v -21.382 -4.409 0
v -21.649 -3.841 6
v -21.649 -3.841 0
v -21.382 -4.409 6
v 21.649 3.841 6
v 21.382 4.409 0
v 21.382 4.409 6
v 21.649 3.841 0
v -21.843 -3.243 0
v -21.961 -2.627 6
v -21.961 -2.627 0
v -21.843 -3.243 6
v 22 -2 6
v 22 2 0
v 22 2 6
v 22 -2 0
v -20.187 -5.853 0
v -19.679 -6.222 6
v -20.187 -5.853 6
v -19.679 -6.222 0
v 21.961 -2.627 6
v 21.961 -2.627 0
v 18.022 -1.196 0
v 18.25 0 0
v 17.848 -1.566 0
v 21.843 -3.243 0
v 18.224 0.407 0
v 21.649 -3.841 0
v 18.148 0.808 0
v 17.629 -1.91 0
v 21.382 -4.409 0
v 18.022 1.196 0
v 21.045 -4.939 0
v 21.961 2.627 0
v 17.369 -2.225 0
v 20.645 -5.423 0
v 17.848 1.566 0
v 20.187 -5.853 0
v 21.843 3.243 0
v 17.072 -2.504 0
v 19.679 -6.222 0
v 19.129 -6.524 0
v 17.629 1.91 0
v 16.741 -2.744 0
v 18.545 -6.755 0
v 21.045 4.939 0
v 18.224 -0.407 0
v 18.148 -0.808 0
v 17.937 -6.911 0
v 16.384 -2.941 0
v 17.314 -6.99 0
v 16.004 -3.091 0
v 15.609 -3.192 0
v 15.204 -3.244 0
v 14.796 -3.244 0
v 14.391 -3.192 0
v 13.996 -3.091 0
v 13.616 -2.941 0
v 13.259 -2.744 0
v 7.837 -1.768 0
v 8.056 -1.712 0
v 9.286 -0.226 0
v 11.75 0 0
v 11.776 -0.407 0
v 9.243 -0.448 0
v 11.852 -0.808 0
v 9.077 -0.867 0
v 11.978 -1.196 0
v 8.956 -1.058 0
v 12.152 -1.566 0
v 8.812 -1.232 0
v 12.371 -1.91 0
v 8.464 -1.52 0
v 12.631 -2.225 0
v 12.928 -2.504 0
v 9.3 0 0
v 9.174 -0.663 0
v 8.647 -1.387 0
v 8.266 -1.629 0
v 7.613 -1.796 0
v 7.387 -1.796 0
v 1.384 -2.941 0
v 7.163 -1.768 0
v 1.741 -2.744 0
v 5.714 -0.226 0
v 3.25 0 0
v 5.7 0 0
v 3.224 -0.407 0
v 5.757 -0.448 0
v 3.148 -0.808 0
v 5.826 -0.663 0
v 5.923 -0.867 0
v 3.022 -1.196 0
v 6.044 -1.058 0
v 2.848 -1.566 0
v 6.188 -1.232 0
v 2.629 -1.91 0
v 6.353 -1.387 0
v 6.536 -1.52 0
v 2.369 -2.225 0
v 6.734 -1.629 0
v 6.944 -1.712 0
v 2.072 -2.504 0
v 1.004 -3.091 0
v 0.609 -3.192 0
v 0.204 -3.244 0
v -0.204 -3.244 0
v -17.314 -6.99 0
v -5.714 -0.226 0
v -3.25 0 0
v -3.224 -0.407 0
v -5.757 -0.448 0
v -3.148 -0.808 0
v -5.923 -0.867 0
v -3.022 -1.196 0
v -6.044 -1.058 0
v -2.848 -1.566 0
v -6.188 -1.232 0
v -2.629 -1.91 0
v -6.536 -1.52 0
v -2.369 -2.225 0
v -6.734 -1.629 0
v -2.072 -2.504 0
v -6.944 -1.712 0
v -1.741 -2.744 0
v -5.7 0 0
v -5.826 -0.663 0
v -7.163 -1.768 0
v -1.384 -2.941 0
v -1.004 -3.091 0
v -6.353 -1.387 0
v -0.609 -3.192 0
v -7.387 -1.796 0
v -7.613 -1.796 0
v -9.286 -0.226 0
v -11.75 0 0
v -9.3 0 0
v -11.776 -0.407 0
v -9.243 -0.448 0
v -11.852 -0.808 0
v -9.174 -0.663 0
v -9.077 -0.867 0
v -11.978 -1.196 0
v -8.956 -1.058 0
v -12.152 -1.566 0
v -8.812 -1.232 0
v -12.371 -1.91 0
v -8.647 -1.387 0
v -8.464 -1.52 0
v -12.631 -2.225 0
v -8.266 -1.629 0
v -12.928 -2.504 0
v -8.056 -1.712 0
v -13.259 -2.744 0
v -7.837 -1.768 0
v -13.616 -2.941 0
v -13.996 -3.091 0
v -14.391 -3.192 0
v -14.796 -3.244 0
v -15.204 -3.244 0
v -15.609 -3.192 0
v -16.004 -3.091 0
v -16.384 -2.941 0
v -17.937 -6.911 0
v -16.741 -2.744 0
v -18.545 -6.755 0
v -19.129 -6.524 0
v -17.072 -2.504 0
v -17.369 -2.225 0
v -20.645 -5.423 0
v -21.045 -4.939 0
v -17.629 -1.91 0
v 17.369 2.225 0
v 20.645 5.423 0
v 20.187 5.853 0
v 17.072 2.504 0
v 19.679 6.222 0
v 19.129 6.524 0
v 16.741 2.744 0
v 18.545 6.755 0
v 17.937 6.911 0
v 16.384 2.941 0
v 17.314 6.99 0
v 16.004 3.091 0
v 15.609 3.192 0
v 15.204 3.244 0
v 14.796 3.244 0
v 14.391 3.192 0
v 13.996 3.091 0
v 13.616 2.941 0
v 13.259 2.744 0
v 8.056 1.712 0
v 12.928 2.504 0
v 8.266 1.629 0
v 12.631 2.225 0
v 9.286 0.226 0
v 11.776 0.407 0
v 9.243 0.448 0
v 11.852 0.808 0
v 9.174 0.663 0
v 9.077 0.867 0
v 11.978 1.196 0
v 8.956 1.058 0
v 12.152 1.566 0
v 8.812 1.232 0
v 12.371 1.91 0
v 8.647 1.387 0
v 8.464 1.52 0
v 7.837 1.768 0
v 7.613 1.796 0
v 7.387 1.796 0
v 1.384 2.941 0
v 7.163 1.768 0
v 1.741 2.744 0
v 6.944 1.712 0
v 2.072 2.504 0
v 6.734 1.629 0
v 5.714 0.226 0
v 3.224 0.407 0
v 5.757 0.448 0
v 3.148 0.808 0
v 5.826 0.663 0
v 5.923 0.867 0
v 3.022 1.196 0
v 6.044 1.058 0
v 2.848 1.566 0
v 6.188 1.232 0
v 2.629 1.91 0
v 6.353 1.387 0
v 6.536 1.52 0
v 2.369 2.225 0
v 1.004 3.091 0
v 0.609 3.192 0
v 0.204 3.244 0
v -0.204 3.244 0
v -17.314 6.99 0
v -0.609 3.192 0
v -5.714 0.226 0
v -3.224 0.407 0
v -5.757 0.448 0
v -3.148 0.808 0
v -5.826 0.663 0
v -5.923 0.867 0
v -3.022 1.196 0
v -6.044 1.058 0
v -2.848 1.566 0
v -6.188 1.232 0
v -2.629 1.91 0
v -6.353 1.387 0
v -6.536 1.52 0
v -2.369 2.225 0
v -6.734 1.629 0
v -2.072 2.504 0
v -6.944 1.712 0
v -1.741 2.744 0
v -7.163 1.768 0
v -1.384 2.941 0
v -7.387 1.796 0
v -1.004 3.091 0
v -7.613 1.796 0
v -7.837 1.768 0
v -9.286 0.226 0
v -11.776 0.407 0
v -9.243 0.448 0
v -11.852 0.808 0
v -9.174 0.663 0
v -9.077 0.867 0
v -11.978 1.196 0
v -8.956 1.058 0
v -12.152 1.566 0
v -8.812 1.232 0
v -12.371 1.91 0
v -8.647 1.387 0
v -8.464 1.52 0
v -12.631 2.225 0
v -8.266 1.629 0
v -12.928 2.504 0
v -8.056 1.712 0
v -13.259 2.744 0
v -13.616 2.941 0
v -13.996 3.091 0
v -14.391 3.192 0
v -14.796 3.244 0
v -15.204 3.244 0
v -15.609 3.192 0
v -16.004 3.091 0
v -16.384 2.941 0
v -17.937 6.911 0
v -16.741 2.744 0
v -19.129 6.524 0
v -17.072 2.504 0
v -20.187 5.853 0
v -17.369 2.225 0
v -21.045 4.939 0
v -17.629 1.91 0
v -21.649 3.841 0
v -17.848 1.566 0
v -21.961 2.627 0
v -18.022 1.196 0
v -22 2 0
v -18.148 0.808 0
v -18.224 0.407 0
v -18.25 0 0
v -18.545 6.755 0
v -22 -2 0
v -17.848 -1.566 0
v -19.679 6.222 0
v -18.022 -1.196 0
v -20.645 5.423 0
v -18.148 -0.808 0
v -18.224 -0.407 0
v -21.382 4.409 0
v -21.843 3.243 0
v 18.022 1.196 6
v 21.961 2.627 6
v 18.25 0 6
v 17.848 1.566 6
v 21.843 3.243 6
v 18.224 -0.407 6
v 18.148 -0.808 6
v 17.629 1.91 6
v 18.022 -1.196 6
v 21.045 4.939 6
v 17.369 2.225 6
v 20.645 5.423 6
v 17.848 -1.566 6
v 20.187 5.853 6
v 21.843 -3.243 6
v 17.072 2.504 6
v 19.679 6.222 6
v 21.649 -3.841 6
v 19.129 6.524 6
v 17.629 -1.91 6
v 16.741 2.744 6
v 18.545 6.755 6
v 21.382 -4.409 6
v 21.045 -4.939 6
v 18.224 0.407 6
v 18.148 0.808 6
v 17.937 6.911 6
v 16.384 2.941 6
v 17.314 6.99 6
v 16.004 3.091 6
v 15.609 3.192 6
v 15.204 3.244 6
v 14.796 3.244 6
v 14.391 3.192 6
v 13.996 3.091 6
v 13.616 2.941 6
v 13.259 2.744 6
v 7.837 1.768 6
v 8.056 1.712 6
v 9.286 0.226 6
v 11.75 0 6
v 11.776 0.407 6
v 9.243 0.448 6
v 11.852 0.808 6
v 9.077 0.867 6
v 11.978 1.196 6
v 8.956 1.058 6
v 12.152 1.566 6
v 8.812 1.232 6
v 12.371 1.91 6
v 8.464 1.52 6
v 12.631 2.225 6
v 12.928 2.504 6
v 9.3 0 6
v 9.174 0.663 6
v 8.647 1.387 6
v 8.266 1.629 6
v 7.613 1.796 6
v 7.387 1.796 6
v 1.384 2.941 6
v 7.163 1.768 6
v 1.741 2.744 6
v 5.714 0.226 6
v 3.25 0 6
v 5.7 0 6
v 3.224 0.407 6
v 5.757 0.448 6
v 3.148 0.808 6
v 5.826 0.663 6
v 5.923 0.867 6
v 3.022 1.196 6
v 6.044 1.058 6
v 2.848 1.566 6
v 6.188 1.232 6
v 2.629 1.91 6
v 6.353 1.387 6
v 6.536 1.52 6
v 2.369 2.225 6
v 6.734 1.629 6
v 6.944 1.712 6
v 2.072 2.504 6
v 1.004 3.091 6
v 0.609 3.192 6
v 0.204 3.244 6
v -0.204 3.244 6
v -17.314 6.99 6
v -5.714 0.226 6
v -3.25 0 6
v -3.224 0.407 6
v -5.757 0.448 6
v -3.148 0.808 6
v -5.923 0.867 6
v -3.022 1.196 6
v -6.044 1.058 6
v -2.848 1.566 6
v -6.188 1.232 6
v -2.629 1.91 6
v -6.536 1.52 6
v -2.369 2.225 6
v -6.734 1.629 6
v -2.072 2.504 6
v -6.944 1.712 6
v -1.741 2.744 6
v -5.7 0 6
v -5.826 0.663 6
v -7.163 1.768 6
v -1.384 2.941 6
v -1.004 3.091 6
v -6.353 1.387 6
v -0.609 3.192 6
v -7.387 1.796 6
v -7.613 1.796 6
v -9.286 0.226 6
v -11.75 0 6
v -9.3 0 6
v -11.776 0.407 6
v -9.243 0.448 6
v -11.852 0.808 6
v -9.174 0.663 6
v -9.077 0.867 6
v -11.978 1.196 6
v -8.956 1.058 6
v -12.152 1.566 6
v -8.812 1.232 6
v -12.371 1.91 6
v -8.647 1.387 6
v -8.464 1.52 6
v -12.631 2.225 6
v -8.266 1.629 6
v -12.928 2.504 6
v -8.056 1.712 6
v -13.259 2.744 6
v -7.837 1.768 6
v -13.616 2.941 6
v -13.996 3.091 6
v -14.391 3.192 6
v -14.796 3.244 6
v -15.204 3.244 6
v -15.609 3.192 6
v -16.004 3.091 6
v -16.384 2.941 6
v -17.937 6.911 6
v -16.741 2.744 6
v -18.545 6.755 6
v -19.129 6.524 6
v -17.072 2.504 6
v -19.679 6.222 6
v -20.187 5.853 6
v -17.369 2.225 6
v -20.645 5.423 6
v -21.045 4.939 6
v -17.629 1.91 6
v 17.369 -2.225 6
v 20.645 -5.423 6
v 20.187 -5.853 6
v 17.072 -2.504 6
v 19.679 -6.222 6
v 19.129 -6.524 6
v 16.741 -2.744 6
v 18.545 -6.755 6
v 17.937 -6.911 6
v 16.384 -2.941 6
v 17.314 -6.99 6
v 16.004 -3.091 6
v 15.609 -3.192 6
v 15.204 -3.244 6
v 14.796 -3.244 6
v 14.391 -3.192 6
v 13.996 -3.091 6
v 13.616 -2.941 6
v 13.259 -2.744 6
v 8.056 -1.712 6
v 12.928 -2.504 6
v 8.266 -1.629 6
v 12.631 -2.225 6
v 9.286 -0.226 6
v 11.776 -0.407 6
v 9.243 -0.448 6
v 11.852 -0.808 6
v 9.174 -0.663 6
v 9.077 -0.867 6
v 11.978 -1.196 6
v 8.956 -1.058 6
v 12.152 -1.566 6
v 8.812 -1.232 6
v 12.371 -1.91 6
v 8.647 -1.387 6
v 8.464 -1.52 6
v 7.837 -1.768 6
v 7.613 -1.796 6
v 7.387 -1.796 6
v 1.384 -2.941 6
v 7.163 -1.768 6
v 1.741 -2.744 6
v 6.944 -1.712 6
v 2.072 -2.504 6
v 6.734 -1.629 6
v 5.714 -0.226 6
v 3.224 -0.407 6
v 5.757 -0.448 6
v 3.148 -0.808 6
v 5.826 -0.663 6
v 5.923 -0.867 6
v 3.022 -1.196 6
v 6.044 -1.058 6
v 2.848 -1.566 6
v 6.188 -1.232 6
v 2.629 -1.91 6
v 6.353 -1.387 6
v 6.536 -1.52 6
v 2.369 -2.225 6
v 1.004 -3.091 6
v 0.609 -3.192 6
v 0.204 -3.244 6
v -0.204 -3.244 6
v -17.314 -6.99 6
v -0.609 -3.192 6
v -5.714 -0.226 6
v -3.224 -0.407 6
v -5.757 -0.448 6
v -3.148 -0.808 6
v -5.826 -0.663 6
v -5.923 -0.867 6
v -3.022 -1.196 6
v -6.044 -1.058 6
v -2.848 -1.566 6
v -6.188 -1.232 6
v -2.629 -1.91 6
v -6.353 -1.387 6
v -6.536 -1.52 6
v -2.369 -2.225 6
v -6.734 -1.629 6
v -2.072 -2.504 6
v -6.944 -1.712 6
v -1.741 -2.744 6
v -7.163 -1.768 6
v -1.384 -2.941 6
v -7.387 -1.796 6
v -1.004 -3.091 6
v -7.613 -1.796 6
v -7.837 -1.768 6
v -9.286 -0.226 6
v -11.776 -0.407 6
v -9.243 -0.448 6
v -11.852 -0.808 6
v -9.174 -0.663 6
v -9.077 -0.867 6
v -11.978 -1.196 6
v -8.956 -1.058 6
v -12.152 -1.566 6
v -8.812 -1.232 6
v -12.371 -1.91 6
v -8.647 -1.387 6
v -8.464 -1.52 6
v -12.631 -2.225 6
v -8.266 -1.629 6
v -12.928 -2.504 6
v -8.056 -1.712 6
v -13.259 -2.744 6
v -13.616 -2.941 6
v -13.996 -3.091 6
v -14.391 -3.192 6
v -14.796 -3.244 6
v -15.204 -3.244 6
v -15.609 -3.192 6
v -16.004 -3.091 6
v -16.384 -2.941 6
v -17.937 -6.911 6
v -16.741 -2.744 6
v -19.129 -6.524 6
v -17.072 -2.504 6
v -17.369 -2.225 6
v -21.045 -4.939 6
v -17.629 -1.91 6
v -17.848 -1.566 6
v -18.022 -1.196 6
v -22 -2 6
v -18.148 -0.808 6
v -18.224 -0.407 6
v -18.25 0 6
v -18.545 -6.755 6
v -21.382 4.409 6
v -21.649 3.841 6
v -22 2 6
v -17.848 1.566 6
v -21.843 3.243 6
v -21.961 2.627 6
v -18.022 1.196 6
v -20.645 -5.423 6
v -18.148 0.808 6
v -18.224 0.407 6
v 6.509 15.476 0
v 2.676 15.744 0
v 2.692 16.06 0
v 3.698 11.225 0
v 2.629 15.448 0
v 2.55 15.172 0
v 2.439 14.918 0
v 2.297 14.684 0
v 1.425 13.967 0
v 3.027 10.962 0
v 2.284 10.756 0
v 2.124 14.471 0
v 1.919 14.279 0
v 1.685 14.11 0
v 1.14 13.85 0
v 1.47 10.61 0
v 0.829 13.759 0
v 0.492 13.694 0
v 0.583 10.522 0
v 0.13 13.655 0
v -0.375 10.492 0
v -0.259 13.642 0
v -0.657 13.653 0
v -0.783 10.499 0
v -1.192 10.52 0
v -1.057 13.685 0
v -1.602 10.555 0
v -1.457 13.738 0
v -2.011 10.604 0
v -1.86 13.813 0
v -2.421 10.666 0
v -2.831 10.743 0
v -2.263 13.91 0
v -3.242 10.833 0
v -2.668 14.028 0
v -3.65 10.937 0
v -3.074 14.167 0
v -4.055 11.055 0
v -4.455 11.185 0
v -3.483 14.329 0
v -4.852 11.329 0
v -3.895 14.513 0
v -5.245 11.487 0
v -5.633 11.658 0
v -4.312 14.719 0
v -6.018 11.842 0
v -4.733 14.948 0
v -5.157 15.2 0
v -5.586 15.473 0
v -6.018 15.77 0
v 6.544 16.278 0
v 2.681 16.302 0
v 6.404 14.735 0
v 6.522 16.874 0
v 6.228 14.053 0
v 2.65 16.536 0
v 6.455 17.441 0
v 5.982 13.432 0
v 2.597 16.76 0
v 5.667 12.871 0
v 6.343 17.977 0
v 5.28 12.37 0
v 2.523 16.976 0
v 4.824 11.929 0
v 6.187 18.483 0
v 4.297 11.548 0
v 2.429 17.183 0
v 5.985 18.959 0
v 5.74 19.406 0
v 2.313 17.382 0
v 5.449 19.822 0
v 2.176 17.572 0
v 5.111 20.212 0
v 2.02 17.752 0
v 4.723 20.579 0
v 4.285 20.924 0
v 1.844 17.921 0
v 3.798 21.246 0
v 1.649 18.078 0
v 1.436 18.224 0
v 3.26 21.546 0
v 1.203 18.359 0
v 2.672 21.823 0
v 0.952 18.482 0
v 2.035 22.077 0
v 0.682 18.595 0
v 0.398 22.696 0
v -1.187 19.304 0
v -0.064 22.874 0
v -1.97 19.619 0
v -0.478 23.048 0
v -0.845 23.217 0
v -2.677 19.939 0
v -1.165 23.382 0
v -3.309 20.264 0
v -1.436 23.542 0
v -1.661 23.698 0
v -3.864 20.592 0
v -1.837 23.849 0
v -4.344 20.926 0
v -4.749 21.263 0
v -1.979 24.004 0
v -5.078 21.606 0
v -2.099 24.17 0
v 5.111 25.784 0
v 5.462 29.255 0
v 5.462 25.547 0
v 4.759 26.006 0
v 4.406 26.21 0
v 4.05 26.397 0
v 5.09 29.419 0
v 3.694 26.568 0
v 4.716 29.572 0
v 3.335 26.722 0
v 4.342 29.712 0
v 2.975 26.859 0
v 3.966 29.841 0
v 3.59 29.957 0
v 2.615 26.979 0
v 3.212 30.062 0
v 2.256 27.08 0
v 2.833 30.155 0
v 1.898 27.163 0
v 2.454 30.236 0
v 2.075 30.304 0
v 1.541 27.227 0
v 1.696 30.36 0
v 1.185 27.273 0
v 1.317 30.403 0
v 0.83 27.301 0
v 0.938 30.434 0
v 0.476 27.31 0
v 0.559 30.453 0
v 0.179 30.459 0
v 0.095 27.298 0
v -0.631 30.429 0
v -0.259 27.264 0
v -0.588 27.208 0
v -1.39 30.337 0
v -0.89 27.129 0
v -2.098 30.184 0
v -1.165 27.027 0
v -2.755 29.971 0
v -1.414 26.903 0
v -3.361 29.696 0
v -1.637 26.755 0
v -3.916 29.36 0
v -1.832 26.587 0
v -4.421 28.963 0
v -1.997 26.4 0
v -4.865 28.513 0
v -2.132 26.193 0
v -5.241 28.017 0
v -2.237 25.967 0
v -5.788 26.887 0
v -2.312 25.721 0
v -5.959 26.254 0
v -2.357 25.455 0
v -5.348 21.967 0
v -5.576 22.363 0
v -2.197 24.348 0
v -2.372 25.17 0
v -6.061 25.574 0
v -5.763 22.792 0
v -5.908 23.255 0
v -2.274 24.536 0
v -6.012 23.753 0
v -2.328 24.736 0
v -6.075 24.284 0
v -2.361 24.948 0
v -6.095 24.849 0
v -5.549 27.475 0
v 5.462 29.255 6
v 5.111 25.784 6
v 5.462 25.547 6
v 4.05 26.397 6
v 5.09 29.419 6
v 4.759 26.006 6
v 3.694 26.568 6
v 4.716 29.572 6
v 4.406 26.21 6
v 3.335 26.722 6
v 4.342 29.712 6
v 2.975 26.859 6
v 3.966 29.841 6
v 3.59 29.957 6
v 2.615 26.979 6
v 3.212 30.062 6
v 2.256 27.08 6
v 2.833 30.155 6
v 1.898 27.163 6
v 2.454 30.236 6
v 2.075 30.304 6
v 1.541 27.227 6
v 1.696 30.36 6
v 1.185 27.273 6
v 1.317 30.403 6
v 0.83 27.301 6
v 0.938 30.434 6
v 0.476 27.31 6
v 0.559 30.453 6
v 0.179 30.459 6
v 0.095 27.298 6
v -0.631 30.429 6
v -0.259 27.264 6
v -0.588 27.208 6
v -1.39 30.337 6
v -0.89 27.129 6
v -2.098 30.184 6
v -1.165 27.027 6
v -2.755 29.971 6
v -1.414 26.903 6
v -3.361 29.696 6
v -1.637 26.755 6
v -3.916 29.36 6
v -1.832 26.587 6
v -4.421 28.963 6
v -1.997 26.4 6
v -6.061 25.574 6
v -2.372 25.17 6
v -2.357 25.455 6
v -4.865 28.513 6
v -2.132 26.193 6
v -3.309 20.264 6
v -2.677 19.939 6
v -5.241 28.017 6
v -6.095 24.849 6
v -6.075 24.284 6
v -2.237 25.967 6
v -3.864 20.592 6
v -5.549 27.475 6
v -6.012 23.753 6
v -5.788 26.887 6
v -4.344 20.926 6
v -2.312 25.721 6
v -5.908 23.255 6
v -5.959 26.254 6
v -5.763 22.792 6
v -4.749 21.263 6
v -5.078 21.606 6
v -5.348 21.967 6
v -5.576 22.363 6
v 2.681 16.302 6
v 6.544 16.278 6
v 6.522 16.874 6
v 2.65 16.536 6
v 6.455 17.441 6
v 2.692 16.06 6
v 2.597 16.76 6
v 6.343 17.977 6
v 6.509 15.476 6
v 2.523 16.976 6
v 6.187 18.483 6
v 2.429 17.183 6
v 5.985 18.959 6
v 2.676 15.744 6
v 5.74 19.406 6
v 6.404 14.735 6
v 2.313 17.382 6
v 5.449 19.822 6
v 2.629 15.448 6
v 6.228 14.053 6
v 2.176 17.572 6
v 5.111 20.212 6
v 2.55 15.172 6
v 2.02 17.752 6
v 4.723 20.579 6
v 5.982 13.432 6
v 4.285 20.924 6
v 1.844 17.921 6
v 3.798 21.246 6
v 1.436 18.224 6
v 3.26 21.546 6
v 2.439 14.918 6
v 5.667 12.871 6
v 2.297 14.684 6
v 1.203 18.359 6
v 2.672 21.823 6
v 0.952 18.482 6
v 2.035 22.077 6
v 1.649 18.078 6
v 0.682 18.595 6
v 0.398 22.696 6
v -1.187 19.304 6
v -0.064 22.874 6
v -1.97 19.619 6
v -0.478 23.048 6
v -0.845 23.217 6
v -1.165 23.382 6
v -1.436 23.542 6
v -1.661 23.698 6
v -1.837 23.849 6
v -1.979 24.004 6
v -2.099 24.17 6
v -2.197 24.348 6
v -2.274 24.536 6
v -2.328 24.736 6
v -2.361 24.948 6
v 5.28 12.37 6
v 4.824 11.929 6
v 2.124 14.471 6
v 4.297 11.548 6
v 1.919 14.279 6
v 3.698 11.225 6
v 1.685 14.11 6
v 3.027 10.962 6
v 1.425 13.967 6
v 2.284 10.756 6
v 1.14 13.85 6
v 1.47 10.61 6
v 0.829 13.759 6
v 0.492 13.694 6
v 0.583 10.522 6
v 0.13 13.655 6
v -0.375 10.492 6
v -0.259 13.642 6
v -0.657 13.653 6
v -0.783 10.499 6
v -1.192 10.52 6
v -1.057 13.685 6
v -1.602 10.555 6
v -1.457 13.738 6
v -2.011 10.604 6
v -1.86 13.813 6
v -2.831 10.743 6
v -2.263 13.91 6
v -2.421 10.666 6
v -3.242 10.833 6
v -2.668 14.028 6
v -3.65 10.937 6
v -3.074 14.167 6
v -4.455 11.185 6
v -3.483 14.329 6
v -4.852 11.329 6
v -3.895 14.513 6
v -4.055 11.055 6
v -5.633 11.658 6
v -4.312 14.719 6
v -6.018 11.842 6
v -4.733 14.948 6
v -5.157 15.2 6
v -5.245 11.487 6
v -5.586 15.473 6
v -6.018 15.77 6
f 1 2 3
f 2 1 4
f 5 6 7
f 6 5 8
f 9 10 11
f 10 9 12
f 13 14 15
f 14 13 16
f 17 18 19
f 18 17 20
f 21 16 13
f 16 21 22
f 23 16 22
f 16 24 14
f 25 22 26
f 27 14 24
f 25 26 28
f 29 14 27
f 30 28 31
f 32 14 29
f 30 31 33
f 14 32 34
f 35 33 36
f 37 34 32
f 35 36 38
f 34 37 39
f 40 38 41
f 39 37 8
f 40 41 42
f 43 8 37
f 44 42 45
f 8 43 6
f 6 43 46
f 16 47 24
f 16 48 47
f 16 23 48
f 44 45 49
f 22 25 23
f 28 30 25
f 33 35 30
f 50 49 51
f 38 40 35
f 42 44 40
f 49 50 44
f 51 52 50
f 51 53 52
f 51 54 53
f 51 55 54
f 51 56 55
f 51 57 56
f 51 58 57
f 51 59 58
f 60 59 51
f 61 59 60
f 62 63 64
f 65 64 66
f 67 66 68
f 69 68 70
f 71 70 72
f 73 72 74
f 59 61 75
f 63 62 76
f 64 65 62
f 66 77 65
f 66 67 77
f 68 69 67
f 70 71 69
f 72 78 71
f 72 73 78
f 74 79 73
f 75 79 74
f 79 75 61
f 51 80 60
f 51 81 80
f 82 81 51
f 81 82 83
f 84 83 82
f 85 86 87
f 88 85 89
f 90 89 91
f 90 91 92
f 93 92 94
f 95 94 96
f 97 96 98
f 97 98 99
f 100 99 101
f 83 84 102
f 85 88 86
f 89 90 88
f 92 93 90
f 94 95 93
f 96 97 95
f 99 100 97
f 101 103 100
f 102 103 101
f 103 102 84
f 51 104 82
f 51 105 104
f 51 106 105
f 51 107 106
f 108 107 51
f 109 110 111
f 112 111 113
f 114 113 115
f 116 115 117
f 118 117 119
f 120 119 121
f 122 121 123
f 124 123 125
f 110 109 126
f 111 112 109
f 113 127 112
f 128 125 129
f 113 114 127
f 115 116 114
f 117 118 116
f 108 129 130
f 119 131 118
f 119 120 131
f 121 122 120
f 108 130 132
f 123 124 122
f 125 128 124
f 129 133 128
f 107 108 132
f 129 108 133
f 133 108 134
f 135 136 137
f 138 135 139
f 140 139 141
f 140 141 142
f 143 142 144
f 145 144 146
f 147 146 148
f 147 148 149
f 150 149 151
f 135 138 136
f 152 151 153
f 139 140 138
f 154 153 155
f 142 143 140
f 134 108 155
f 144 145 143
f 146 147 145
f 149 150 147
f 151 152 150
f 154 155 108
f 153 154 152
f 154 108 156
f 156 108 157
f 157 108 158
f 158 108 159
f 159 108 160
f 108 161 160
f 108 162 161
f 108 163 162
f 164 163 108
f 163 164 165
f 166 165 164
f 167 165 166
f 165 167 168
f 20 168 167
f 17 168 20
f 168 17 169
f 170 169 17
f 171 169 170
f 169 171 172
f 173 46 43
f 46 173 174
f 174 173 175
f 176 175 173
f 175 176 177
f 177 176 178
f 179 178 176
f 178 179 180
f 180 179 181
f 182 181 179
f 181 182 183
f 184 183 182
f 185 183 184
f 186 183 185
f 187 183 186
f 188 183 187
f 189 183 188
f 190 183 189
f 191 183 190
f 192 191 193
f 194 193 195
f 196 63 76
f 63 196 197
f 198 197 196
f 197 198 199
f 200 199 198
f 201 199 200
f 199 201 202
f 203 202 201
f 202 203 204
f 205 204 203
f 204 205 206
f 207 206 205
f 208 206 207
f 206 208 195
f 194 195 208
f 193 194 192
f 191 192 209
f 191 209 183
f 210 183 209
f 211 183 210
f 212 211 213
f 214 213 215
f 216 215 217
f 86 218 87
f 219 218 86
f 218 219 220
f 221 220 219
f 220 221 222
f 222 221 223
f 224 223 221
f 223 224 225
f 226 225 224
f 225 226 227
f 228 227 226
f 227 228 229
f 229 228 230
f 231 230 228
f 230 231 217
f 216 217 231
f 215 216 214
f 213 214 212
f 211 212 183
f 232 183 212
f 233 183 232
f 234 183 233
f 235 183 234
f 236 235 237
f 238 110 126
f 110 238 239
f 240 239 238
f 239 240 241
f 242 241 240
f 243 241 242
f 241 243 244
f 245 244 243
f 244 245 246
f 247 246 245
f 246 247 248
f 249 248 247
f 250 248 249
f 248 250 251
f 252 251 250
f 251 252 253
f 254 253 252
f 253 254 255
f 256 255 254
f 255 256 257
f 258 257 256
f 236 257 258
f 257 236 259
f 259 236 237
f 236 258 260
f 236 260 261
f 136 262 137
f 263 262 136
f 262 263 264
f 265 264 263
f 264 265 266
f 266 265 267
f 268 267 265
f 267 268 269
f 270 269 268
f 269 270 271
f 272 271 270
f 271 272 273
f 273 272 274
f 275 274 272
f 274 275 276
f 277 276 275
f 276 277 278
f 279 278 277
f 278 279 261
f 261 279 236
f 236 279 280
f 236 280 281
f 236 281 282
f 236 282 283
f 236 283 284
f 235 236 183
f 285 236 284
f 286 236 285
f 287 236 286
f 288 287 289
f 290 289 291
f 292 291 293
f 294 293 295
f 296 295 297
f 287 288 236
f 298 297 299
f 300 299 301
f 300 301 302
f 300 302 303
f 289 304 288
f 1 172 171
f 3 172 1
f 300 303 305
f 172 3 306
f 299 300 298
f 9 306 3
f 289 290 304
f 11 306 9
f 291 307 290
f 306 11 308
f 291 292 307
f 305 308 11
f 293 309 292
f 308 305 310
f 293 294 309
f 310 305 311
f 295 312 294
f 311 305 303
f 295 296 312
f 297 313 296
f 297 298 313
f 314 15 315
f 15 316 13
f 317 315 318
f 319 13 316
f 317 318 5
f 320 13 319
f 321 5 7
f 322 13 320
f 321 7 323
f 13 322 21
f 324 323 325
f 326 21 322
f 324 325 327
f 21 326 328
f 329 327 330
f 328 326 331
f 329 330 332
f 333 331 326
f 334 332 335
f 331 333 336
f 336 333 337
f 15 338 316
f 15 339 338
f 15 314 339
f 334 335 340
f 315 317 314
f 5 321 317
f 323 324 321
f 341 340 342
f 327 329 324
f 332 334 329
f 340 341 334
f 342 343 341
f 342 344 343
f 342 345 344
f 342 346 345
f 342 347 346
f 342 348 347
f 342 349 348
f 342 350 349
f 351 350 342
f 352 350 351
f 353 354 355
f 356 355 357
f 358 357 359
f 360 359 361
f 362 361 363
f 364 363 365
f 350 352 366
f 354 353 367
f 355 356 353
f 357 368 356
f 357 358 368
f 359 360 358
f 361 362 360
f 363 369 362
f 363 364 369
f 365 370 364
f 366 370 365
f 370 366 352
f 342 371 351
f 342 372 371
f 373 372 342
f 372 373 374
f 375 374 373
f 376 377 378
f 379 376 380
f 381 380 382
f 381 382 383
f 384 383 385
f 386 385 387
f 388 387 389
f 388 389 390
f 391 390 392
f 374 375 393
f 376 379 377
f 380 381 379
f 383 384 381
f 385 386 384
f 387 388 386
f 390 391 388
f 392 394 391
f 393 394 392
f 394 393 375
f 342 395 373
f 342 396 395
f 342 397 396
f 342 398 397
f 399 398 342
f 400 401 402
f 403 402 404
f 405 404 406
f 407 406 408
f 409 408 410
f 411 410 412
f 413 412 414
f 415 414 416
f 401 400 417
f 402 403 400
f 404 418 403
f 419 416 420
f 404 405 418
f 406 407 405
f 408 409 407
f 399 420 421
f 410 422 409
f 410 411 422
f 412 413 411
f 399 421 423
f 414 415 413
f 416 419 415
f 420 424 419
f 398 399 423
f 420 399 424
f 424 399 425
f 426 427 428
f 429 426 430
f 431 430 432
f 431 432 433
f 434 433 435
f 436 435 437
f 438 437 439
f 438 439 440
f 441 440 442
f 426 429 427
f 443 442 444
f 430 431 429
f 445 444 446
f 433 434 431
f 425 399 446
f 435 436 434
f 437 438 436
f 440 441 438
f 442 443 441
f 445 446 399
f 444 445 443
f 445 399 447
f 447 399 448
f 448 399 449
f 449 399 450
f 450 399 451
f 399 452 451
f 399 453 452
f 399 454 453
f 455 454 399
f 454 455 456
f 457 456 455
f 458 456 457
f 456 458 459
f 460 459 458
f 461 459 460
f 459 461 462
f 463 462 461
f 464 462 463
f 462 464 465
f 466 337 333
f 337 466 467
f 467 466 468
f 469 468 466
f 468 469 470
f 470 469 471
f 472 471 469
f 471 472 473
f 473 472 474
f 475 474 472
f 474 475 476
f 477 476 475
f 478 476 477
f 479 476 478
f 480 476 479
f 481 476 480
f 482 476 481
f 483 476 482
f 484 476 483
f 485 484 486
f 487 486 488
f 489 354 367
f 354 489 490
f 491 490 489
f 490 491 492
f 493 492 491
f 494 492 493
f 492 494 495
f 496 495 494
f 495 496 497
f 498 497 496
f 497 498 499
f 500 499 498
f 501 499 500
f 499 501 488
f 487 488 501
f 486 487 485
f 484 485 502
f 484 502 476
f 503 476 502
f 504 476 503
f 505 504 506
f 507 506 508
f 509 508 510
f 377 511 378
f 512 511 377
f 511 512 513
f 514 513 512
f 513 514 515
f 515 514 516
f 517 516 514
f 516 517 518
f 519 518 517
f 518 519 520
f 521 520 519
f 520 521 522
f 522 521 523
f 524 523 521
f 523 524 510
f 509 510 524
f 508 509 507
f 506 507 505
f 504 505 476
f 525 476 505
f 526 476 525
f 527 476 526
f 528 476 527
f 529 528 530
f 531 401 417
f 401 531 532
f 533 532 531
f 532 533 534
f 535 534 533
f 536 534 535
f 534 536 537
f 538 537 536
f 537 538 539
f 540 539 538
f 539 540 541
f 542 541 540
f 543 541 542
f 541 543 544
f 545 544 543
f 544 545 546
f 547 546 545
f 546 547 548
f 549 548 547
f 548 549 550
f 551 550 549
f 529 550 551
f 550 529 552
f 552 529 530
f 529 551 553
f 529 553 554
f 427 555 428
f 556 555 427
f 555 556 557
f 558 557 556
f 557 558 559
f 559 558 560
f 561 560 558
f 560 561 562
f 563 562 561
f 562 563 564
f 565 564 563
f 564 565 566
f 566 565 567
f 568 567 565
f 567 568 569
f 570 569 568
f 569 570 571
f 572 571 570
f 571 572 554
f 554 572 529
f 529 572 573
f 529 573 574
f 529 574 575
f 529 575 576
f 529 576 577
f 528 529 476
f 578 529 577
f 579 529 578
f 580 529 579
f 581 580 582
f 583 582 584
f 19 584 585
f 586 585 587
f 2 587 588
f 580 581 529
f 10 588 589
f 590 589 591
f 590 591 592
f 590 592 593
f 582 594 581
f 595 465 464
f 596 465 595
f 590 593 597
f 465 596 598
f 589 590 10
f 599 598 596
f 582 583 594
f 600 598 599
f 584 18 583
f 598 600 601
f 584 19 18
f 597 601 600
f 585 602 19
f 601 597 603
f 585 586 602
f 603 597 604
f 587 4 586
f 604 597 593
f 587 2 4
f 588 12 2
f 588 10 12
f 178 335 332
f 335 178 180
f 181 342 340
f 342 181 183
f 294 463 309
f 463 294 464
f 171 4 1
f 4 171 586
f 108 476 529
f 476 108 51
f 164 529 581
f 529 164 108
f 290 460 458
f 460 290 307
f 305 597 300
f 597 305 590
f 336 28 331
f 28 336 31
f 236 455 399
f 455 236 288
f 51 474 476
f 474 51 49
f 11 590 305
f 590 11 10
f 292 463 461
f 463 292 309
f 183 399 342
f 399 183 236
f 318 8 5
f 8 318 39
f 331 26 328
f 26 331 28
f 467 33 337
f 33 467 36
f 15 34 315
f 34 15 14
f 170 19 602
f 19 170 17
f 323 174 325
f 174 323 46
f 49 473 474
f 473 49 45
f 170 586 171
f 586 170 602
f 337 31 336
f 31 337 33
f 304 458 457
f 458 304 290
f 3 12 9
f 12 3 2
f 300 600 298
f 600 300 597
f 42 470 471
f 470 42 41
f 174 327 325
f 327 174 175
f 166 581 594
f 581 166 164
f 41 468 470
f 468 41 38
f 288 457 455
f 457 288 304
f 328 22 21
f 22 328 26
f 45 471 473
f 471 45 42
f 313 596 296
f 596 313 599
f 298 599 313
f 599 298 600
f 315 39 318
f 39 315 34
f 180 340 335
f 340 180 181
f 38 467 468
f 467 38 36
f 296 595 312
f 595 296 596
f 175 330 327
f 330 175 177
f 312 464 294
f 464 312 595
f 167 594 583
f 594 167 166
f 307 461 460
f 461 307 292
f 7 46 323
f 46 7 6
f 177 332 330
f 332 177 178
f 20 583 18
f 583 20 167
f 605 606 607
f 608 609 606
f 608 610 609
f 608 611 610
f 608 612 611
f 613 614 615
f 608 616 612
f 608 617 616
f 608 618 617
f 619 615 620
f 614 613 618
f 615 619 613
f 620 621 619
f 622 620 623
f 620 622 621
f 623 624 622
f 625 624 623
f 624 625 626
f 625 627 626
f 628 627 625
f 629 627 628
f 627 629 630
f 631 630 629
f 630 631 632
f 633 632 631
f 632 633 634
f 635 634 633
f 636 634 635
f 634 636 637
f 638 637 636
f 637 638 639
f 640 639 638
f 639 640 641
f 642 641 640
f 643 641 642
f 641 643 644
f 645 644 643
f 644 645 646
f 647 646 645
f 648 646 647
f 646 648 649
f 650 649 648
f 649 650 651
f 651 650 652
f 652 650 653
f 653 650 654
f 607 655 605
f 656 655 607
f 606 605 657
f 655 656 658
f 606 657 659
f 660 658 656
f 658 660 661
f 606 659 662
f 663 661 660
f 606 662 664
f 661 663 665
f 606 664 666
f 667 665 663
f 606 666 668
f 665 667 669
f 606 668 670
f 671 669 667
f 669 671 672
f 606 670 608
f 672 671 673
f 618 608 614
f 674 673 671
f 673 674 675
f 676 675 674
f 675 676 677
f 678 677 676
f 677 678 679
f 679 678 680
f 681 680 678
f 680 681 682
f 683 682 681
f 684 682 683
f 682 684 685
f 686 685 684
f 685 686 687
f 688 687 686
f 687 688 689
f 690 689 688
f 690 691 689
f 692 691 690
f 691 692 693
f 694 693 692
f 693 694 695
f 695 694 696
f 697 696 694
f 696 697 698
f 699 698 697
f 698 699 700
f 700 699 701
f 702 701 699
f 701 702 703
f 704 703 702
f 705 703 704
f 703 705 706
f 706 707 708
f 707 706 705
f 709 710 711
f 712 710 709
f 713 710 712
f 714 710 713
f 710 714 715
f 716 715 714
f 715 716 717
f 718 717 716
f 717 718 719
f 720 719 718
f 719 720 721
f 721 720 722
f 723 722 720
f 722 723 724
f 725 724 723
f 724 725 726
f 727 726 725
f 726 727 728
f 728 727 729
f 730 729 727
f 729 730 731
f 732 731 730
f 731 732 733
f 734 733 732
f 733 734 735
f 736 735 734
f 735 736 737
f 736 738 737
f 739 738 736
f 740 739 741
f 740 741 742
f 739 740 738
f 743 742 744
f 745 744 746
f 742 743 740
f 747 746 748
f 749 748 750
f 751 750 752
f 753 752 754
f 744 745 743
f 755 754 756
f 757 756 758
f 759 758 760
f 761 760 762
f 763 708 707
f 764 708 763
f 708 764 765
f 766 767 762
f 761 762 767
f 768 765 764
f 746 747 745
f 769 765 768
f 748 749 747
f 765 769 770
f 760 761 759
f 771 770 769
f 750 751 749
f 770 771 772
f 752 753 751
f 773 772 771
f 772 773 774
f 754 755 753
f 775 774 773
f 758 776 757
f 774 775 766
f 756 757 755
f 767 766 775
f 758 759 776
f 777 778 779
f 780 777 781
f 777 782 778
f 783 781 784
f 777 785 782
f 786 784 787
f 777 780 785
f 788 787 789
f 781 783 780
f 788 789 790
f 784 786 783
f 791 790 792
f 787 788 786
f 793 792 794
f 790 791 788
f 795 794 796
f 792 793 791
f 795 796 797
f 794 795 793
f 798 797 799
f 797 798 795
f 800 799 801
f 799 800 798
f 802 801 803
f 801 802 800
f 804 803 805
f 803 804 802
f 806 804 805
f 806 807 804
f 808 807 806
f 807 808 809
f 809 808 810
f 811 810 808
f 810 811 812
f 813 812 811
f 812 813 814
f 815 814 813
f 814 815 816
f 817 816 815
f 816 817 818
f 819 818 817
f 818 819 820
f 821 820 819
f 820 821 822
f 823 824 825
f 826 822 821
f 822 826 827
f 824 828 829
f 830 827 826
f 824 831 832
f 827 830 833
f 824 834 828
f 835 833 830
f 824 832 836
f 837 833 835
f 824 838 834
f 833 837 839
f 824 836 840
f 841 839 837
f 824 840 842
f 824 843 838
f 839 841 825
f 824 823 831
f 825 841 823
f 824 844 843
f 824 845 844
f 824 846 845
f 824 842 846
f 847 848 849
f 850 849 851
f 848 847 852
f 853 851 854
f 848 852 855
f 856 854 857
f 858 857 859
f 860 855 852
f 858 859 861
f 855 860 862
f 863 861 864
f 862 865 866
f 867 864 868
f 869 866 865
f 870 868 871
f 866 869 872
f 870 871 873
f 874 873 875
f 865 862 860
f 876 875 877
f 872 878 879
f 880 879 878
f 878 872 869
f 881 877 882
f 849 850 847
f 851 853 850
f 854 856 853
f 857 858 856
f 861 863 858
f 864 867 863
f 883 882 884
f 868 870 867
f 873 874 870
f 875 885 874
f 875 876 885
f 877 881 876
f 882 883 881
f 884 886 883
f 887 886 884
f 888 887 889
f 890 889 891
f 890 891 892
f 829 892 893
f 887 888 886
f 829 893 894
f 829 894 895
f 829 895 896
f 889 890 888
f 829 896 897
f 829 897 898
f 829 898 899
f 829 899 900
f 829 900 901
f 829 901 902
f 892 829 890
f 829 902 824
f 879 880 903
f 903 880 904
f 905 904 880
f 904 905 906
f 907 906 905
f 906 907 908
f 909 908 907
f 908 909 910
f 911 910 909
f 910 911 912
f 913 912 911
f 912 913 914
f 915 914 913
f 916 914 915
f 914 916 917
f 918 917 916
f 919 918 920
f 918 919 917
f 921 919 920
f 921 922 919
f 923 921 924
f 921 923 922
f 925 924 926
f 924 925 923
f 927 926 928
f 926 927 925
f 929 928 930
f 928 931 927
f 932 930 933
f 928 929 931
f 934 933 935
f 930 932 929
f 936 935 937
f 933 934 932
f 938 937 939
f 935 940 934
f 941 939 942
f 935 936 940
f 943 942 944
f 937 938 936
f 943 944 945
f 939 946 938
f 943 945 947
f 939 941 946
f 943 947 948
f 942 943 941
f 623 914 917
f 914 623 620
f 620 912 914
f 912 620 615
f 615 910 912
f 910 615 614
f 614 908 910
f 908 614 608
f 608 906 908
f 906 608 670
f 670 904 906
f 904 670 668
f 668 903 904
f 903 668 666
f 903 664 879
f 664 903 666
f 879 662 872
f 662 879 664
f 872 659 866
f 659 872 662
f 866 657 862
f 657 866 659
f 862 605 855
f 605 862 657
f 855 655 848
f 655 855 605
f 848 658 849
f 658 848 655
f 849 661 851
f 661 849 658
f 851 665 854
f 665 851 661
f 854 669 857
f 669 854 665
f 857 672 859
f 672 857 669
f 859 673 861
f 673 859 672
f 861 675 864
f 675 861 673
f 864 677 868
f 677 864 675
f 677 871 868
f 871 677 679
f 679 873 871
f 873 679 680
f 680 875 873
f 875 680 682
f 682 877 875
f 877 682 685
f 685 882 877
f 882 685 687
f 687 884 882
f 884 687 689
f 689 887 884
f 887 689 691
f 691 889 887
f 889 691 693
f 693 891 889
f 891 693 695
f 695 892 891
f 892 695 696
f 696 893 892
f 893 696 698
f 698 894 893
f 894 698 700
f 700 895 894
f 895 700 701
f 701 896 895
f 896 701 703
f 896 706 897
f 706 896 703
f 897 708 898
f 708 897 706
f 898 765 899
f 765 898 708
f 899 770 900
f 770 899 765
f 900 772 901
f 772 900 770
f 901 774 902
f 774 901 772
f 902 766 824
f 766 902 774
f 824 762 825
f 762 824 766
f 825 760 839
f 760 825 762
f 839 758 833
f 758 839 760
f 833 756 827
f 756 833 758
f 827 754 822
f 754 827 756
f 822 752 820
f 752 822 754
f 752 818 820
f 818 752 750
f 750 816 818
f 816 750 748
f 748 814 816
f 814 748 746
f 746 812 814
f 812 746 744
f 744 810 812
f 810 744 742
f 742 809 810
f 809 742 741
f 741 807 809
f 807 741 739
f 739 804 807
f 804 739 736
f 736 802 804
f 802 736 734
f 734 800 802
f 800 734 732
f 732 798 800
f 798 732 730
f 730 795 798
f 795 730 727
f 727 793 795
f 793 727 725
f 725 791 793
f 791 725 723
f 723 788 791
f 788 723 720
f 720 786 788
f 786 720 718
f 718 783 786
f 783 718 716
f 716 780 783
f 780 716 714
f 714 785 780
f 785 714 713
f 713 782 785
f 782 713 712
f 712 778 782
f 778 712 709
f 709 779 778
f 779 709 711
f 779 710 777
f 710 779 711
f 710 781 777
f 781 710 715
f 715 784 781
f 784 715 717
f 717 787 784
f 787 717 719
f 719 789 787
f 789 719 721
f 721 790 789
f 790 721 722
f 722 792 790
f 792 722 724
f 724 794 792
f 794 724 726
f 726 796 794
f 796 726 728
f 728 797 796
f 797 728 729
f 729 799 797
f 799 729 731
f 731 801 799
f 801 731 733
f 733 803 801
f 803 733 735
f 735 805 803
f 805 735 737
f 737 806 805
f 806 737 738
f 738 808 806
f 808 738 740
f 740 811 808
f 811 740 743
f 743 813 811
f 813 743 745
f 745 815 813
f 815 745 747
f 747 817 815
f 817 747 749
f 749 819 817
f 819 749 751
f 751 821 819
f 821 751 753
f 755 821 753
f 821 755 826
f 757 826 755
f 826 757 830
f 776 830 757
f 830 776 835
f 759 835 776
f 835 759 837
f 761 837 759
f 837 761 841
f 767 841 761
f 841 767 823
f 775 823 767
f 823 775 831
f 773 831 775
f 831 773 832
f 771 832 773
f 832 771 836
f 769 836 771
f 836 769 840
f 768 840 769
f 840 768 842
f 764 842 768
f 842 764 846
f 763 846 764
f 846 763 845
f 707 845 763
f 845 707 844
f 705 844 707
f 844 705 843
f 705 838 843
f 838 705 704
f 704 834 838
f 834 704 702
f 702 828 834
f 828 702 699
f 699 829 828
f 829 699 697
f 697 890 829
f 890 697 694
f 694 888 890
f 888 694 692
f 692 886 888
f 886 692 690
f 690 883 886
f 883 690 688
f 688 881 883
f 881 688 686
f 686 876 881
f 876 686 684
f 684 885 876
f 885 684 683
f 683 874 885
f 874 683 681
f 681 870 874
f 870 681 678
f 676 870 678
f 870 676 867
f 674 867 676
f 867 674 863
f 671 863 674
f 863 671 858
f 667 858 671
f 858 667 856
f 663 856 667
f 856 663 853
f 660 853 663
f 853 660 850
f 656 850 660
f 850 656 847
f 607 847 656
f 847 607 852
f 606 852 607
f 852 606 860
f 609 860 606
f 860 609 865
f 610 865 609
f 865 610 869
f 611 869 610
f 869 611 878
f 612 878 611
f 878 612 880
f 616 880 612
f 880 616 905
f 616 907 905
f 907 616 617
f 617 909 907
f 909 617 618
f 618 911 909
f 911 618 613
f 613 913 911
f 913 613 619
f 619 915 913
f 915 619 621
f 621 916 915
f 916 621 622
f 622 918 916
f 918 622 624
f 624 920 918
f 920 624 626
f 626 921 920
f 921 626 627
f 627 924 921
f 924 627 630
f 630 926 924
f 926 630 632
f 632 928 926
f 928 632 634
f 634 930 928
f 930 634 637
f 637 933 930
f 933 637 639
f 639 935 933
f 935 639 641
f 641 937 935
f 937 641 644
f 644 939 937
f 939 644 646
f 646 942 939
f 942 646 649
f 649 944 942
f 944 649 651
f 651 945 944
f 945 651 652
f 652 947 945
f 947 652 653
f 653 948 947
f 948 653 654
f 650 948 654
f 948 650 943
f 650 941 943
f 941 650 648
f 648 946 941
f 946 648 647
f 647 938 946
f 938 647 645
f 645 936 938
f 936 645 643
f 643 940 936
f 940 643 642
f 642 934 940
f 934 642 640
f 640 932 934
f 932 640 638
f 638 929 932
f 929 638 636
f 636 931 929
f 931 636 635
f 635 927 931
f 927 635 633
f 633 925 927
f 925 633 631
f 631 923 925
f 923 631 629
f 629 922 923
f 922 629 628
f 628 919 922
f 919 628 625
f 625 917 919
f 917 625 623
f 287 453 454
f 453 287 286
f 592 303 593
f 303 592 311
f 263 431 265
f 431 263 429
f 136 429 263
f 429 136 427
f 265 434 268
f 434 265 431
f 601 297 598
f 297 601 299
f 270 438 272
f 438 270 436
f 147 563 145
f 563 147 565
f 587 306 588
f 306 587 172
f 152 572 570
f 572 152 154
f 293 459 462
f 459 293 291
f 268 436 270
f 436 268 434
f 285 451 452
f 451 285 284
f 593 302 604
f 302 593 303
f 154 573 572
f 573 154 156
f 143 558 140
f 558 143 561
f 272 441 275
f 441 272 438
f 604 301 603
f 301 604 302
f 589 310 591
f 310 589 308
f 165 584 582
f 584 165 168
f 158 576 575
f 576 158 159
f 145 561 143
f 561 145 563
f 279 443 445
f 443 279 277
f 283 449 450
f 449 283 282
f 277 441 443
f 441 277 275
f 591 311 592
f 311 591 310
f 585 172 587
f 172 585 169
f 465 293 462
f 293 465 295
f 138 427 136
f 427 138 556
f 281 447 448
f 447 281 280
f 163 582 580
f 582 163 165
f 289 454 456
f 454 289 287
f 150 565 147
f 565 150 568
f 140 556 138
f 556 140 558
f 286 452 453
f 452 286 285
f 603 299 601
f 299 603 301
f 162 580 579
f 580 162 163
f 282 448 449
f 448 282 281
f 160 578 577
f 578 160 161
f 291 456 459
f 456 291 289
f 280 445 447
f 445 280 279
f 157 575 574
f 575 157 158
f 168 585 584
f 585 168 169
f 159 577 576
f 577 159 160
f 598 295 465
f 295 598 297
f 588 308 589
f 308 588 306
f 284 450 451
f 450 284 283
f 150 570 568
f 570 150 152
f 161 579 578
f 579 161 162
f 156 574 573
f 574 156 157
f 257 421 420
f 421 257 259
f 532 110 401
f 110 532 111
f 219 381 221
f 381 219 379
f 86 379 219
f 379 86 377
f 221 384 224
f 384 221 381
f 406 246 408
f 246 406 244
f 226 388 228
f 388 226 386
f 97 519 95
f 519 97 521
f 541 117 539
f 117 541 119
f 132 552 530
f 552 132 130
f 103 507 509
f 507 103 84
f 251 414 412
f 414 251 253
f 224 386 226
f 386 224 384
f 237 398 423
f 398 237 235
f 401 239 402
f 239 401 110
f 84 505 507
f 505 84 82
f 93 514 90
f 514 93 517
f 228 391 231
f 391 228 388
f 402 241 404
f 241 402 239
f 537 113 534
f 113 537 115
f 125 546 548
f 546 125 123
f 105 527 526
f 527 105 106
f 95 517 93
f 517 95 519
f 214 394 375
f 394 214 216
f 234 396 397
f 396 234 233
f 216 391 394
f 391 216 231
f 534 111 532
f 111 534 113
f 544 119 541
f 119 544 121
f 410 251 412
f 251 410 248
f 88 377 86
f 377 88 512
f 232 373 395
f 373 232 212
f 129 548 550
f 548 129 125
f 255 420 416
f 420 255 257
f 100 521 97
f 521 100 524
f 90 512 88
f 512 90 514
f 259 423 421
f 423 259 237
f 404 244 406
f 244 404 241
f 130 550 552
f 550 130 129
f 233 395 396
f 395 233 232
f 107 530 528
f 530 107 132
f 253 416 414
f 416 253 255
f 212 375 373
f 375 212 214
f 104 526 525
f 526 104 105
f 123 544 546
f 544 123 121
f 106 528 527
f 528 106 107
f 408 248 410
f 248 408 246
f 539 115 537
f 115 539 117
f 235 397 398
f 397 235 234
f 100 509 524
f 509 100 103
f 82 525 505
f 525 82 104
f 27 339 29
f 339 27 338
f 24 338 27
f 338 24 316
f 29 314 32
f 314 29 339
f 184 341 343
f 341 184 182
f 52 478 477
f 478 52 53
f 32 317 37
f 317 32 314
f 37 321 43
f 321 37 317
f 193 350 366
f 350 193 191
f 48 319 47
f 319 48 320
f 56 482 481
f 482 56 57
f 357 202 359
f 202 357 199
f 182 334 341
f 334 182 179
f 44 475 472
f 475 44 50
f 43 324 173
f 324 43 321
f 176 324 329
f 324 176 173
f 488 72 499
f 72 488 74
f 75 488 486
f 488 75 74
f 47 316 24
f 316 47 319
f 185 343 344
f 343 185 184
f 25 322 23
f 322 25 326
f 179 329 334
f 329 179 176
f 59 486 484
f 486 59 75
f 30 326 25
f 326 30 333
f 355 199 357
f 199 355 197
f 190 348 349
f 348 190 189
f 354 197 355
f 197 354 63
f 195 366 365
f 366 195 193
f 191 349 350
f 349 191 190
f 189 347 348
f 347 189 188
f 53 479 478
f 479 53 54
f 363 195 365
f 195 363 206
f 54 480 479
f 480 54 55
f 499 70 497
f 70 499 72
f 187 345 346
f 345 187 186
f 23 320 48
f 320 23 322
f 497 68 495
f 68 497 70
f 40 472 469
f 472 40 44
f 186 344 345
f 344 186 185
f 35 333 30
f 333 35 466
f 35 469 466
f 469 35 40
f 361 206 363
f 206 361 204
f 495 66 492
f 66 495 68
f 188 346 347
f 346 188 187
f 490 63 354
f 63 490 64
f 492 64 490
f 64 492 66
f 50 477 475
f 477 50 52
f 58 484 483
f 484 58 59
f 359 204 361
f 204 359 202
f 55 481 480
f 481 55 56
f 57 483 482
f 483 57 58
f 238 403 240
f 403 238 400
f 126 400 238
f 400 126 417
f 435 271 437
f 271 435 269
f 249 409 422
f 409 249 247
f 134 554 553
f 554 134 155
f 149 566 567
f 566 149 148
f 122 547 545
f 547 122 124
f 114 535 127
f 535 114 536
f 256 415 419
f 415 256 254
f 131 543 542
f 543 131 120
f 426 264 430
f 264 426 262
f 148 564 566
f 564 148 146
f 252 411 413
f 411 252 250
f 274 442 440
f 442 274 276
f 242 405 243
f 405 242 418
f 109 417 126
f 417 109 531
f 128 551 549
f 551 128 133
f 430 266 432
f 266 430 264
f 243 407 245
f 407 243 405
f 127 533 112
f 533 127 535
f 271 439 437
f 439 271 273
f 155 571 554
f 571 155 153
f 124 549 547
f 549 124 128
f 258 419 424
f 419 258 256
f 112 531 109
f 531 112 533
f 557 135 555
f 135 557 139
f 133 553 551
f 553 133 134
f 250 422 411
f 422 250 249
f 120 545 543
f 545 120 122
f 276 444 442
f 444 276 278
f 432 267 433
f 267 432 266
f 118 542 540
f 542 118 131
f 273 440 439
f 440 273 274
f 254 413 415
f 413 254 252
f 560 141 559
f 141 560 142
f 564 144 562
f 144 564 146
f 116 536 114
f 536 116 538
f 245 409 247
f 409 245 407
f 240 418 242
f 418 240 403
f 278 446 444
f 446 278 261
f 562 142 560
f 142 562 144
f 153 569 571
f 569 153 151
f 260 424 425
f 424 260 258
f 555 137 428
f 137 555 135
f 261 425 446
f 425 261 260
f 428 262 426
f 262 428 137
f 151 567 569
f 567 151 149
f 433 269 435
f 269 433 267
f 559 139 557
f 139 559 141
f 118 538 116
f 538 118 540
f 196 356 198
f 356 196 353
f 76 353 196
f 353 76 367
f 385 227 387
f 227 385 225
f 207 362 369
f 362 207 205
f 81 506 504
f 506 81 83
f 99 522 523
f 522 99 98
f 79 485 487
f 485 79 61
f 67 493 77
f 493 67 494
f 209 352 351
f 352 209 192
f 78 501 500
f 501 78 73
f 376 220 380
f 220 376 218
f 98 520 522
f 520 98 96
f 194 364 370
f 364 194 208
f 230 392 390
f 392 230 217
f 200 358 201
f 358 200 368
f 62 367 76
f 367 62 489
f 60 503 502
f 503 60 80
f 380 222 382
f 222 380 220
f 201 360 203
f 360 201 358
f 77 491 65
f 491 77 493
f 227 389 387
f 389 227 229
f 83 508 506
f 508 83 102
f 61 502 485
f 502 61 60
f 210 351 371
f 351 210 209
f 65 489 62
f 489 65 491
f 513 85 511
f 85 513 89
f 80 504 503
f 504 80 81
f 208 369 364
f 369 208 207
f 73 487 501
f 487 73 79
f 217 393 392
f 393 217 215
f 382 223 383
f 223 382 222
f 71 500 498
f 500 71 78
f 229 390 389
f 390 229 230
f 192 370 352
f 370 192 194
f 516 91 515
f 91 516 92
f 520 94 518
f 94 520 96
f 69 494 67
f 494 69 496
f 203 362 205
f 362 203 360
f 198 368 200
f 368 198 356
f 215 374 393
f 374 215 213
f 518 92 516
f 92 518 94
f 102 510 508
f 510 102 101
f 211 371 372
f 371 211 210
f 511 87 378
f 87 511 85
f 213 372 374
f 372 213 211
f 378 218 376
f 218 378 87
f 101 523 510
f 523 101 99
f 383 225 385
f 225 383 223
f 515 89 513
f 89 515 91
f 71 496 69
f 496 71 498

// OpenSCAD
$fn = 50;


difference() {
	union() {
		hull() {
			translate(v = [-17.0000000000, 2.0000000000, 0]) {
				cylinder(h = 6, r = 5);
			}
			translate(v = [17.0000000000, 2.0000000000, 0]) {
				cylinder(h = 6, r = 5);
			}
			translate(v = [-17.0000000000, -2.0000000000, 0]) {
				cylinder(h = 6, r = 5);
			}
			translate(v = [17.0000000000, -2.0000000000, 0]) {
				cylinder(h = 6, r = 5);
			}
		}
		translate(v = [0, 30.0000000000, 0]) {
			linear_extrude(height = 6) {
				text(font = "DejaVu Sans Mono:style=Bold", halign = "center", size = 19.0000000000, text = "S", valign = "top");
			}
		}
	}
	union() {
		translate(v = [-15.0000000000, 0.0000000000, 0]) {
			translate(v = [0, 0, -100]) {
				cylinder(h = 200, r = 3.2500000000);
			}
		}
		translate(v = [0, 0, -100]) {
			cylinder(h = 200, r = 3.2500000000);
		}
		translate(v = [15.0000000000, 0.0000000000, 0]) {
			translate(v = [0, 0, -100]) {
				cylinder(h = 200, r = 3.2500000000);
			}
		}
		translate(v = [-15.0000000000, 0.0000000000, 0]) {
			translate(v = [0, 0, -100]) {
				cylinder(h = 200, r = 1.8000000000);
			}
		}
		translate(v = [-7.5000000000, 0.0000000000, 0]) {
			translate(v = [0, 0, -100]) {
				cylinder(h = 200, r = 1.8000000000);
			}
		}
		translate(v = [0, 0, -100]) {
			cylinder(h = 200, r = 1.8000000000);
		}
		translate(v = [7.5000000000, 0.0000000000, 0]) {
			translate(v = [0, 0, -100]) {
				cylinder(h = 200, r = 1.8000000000);
			}
		}
		translate(v = [15.0000000000, 0.0000000000, 0]) {
			translate(v = [0, 0, -100]) {
				cylinder(h = 200, r = 1.8000000000);
			}
		}
	}
}
